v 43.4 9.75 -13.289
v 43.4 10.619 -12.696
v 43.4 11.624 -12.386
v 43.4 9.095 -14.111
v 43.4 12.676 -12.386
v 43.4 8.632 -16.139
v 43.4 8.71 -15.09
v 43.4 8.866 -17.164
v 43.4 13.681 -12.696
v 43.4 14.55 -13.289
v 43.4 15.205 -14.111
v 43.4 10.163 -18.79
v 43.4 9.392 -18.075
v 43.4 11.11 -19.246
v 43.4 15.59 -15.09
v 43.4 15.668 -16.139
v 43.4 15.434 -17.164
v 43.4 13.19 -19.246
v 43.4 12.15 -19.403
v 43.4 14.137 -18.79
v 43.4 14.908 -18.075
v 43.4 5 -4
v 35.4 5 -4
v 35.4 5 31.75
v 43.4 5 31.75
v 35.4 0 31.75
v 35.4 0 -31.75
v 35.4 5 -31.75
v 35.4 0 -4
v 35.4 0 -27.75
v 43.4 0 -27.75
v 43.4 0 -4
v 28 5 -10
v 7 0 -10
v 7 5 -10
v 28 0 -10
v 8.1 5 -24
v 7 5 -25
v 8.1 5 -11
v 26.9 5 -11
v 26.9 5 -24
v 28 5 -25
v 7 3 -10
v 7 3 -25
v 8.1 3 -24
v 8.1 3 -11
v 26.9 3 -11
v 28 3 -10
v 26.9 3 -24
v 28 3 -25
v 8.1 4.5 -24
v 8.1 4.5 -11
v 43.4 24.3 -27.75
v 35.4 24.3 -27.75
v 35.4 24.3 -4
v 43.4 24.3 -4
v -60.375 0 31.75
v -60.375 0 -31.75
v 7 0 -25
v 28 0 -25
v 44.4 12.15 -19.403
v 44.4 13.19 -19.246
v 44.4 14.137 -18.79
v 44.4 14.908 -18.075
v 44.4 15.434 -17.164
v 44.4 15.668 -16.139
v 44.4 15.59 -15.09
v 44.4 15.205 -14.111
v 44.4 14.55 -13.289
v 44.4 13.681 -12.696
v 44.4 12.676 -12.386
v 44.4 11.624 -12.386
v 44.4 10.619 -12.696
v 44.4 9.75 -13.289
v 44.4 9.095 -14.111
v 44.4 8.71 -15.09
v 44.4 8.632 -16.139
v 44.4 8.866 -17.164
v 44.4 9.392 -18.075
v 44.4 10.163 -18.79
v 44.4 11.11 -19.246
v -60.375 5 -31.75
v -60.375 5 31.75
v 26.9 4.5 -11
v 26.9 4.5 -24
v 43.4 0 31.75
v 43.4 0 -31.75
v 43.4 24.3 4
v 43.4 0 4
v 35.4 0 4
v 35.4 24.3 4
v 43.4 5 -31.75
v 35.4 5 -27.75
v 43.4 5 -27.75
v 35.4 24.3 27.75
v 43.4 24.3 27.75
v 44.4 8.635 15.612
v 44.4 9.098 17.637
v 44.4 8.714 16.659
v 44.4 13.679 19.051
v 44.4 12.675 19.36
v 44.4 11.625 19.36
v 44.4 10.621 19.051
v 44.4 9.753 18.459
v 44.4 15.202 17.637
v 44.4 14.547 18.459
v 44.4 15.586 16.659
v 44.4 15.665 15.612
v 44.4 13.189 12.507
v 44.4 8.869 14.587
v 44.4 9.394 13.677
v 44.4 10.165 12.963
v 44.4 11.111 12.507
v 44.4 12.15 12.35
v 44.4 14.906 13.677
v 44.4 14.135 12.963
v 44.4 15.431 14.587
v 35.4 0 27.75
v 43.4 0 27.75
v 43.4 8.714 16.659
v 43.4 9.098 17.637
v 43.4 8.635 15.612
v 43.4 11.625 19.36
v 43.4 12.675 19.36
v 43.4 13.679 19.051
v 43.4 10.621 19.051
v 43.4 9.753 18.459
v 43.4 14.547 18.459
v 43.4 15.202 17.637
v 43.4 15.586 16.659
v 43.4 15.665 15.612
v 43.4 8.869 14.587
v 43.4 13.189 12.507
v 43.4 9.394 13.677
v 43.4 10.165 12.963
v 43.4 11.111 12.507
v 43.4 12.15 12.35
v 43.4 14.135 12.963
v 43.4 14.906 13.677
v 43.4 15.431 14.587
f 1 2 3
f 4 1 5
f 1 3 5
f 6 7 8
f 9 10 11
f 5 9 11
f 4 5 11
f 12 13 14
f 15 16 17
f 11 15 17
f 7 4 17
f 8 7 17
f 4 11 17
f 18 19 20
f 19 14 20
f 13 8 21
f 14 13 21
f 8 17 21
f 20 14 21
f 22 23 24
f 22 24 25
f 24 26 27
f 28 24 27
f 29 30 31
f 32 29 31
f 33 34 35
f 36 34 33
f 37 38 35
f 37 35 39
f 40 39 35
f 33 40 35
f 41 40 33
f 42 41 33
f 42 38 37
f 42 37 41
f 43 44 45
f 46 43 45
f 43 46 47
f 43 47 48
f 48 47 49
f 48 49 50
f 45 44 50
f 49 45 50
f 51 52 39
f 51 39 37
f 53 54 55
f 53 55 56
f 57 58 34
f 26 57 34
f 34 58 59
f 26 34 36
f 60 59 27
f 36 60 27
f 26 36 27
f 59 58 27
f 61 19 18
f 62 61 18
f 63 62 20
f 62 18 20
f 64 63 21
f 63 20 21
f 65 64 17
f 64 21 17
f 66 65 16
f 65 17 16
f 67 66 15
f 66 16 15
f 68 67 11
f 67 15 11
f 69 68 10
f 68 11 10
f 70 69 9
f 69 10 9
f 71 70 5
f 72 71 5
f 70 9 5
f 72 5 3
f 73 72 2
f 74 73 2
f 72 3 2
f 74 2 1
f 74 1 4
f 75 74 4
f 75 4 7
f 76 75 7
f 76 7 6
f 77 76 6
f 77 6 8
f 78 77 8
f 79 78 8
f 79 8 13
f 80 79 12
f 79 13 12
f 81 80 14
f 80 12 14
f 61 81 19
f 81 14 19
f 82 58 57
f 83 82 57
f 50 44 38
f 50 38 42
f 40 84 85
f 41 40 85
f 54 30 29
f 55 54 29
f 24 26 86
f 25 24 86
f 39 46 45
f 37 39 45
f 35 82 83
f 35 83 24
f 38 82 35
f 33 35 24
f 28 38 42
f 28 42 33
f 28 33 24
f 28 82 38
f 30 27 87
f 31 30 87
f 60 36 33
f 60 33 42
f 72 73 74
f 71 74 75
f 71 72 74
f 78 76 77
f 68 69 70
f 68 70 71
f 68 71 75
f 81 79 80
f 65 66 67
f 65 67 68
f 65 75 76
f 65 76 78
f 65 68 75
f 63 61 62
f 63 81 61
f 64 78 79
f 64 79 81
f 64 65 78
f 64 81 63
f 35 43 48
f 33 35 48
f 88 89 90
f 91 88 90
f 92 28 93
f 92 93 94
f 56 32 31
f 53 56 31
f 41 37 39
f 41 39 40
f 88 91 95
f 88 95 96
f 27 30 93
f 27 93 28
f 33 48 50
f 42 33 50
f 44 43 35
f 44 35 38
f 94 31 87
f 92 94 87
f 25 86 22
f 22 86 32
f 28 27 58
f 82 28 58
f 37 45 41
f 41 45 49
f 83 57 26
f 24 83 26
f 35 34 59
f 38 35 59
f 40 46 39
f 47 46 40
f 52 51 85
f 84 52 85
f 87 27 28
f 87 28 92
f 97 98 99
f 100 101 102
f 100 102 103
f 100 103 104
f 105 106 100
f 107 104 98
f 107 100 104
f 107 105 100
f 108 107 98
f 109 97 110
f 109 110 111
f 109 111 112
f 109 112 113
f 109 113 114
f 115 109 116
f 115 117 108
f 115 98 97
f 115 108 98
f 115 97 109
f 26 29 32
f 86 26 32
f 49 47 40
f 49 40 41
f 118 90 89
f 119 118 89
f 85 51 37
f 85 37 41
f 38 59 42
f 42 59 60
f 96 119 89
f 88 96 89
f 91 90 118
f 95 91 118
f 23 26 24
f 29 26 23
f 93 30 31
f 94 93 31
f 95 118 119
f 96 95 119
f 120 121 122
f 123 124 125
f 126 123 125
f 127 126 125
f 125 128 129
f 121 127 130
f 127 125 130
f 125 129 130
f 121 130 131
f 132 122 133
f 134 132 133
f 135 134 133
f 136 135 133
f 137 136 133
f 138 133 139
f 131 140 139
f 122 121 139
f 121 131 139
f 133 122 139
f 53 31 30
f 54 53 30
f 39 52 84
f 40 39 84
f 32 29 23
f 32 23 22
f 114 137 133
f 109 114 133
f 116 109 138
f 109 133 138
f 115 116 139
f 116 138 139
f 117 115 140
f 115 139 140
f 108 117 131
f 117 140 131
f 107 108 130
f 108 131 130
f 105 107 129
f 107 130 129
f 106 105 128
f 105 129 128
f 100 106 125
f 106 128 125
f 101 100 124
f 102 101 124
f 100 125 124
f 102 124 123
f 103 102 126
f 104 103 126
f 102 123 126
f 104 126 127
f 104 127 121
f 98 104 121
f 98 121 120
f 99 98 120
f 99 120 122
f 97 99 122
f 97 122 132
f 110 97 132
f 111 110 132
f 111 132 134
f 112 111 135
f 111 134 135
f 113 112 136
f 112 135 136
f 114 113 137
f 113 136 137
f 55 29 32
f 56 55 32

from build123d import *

# Parameters (mm, degrees)
SKETCH1_W             = 21
SKETCH1_H             = 15
BOSS_EXTRUDE1_DEPTH   = 5
SKETCH1_3_W           = 8
SKETCH1_3_H           = 4
BOSS_EXTRUDE2_DEPTH   = 5
SKETCH1_3_H_2         = 35.75
BOSS_EXTRUDE2_2_DEPTH = 5
BOSS_EXTRUDE3_DEPTH   = 24.3
BOSS_EXTRUDE3_2_DEPTH = 24.3
BOSS_EXTRUDE4_START   = 4.5
SKETCH1_5_W           = 18.8
SKETCH1_5_H           = 13
BOSS_EXTRUDE4_DEPTH   = 0.5
BOSS_EXTRUDE5_START   = 3
SKETCH1_6_W           = 21
SKETCH1_6_H           = 15
SKETCH1_6_W_2         = 18.8
SKETCH1_6_H_2         = 13
BOSS_EXTRUDE5_DEPTH   = 2
SKETCH2_R             = 3.528024563
BOSS_EXTRUDE6_DEPTH   = 1
SKETCH2_R_2           = 3.524637116
BOSS_EXTRUDE6_2_DEPTH = 1


with BuildPart() as part:
    # Sketch1 → Boss-Extrude1 (new body)
    with BuildSketch(Plane(origin=(0, 0, 0), x_dir=(1, 0, 0), z_dir=(0, 1, 0))):
        Polygon((35.4, 27.75), (35.4, 31.75), (-60.375, 31.75), (-60.375, -31.75), (35.4, -31.75), (35.4, -27.75), (35.4, -4), (35.4, 4), align=None)
        with Locations((17.5, 17.5)):
            Rectangle(SKETCH1_W, SKETCH1_H, mode=Mode.SUBTRACT)
    extrude(amount=BOSS_EXTRUDE1_DEPTH)


with BuildPart() as body_2:
    # Sketch1<3> → Boss-Extrude2 (new body)
    with BuildSketch(Plane(origin=(0, 0, 0), x_dir=(1, 0, 0), z_dir=(0, 1, 0))):
        with Locations((39.4, 29.75)):
            Rectangle(SKETCH1_3_W, SKETCH1_3_H)
    extrude(amount=BOSS_EXTRUDE2_DEPTH)


with BuildPart() as body_3:
    # Sketch1<3> → Boss-Extrude2 2 (new body)
    with BuildSketch(Plane(origin=(0, 0, 0), x_dir=(1, 0, 0), z_dir=(0, 1, 0))):
        with Locations((39.4, -13.875)):
            Rectangle(SKETCH1_3_W, SKETCH1_3_H_2)
    extrude(amount=BOSS_EXTRUDE2_2_DEPTH)


with BuildPart() as body_4:
    # Sketch1<4> → Boss-Extrude3 (new body)
    with BuildSketch(Plane(origin=(0, 0, 0), x_dir=(1, 0, 0), z_dir=(0, 1, 0))):
        Polygon((43.4, 4), (43.4, 27.75), (35.4, 27.75), (35.4, 4), (39.4, 4), align=None)
    extrude(amount=BOSS_EXTRUDE3_DEPTH)


with BuildPart() as body_5:
    # Sketch1<4> → Boss-Extrude3 2 (new body)
    with BuildSketch(Plane(origin=(0, 0, 0), x_dir=(1, 0, 0), z_dir=(0, 1, 0))):
        Polygon((43.4, -27.75), (43.4, -4), (39.4, -4), (35.4, -4), (35.4, -27.75), align=None)
    extrude(amount=BOSS_EXTRUDE3_2_DEPTH)


with BuildPart() as body_6:
    # Sketch1<5> → Boss-Extrude4 (new body)
    with BuildSketch(Plane(origin=(0, 0, 0), x_dir=(1, 0, 0), z_dir=(0, 1, 0)).offset(BOSS_EXTRUDE4_START)):
        with Locations((17.5, 17.499967273)):
            Rectangle(SKETCH1_5_W, SKETCH1_5_H)
    extrude(amount=BOSS_EXTRUDE4_DEPTH)


with BuildPart() as body_7:
    # Sketch1<6> → Boss-Extrude5 (new body)
    with BuildSketch(Plane(origin=(0, 0, 0), x_dir=(1, 0, 0), z_dir=(0, 1, 0)).offset(BOSS_EXTRUDE5_START)):
        with Locations((17.5, 17.5)):
            Rectangle(SKETCH1_6_W, SKETCH1_6_H)
        with Locations((17.5, 17.499967273)):
            Rectangle(SKETCH1_6_W_2, SKETCH1_6_H_2, mode=Mode.SUBTRACT)
    extrude(amount=BOSS_EXTRUDE5_DEPTH)


with BuildPart() as body_8:
    # Sketch2 → Boss-Extrude6 (new body)
    with BuildSketch(Plane(origin=(43.4, 0, 0), x_dir=(0, 0, -1), z_dir=(1, 0, 0))):
        with Locations((15.875, 12.15)):
            Circle(SKETCH2_R)
    extrude(amount=BOSS_EXTRUDE6_DEPTH)


with BuildPart() as body_9:
    # Sketch2 → Boss-Extrude6 2 (new body)
    with BuildSketch(Plane(origin=(43.4, 0, 0), x_dir=(0, 0, -1), z_dir=(1, 0, 0))):
        with Locations((-15.875, 12.15)):
            Circle(SKETCH2_R_2)
    extrude(amount=BOSS_EXTRUDE6_2_DEPTH)


solid = Compound([part.part, body_2.part, body_3.part, body_4.part, body_5.part, body_6.part, body_7.part, body_8.part, body_9.part])
